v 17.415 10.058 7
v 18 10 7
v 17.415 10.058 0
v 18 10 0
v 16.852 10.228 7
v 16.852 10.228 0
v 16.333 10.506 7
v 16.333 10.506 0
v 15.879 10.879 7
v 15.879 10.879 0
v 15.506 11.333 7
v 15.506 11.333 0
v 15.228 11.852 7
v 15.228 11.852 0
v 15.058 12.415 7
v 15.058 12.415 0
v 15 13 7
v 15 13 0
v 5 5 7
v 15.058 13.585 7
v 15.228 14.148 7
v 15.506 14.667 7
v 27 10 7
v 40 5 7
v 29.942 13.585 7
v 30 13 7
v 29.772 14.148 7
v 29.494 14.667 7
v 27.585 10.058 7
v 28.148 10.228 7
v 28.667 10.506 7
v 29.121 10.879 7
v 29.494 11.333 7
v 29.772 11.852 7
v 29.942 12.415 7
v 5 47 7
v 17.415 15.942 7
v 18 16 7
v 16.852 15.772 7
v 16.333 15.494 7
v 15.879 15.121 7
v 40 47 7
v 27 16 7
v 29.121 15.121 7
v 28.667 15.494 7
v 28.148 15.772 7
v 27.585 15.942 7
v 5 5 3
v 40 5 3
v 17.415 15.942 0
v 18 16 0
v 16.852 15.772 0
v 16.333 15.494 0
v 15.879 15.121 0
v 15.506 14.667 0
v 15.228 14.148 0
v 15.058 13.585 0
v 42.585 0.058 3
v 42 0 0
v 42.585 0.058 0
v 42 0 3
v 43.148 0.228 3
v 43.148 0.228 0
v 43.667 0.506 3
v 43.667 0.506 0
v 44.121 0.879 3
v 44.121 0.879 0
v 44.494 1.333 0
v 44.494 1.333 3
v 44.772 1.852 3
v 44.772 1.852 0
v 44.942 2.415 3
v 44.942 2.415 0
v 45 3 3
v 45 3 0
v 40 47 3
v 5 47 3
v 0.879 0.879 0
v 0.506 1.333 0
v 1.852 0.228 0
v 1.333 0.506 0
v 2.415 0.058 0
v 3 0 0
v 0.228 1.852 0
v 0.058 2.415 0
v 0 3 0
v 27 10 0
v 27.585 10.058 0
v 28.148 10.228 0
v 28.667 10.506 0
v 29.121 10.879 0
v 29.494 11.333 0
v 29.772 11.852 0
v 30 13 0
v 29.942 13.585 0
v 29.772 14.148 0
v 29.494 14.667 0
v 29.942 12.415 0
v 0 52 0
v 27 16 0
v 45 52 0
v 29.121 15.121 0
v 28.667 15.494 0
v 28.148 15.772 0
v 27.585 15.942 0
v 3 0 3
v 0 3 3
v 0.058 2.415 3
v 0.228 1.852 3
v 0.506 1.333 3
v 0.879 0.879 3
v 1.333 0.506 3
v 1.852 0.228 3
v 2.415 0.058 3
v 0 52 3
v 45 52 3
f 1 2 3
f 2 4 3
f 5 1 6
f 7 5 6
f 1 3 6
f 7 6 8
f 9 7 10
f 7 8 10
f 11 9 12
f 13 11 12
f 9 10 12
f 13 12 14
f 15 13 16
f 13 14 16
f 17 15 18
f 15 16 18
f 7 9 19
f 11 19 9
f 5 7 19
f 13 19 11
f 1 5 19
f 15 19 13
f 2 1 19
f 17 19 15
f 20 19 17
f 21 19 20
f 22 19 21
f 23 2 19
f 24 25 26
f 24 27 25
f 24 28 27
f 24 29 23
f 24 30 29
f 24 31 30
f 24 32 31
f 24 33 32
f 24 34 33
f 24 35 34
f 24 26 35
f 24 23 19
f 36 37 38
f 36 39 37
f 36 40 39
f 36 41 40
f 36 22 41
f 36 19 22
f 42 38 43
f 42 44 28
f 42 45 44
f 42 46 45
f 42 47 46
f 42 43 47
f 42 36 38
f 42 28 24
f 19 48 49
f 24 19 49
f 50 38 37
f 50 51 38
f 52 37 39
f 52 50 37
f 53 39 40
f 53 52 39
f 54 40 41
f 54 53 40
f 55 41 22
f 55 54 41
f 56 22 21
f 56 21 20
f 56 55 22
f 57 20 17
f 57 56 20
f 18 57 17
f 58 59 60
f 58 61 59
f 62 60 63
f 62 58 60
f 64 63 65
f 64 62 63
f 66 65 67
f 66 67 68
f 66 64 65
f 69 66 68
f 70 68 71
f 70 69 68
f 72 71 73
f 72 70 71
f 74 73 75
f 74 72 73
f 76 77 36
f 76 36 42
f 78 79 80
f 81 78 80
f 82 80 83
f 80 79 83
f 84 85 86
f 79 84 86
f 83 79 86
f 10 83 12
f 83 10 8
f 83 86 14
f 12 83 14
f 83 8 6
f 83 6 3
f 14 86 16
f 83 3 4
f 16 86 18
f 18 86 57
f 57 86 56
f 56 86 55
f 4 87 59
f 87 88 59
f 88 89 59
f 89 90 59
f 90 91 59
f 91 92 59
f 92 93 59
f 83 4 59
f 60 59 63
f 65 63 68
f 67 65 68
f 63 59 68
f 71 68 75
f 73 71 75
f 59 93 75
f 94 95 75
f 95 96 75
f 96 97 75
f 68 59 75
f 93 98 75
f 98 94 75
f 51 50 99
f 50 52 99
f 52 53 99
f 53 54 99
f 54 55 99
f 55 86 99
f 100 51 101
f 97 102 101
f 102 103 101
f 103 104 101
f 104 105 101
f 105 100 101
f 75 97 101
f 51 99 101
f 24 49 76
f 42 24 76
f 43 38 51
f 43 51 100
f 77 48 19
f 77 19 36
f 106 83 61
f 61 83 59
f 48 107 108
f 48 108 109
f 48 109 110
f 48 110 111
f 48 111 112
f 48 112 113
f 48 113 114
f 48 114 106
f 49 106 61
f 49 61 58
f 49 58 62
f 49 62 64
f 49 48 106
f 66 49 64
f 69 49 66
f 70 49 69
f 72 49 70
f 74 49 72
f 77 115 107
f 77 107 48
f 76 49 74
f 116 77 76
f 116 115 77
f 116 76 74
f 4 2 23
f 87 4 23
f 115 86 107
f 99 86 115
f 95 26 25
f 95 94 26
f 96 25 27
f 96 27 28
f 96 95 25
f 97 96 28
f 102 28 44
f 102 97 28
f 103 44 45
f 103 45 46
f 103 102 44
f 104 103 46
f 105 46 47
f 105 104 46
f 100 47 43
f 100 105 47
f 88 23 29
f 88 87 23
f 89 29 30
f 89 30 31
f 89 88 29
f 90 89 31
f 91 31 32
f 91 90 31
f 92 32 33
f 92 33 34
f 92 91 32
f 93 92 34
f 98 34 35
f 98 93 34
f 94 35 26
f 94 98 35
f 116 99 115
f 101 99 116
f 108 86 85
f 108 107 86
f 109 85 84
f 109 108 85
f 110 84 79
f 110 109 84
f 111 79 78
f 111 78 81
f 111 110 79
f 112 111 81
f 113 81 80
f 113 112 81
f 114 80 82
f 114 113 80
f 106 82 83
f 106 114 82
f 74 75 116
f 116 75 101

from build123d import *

# Parameters (mm, degrees)
SKETCH1_W           = 45
SKETCH1_H           = 52
BOSS_EXTRUDE1_DEPTH = 3
SKETCH2_W           = 35
SKETCH2_H           = 42
BOSS_EXTRUDE2_DEPTH = 4
SKETCH3_W           = 15
SKETCH3_H           = 6
CUT_EXTRUDE1_DEPTH  = 70.123078635
FILLET1_R           = 3


with BuildPart() as part:
    # Sketch1 → Boss-Extrude1 (new body)
    with BuildSketch(Plane.XY):
        with Locations((22.5, 26)):
            Rectangle(SKETCH1_W, SKETCH1_H)
    extrude(amount=BOSS_EXTRUDE1_DEPTH)

    # Sketch2 → Boss-Extrude2 (add)
    with BuildSketch(Plane.XY.offset(3)):
        with Locations((22.5, 26)):
            Rectangle(SKETCH2_W, SKETCH2_H)
    extrude(amount=BOSS_EXTRUDE2_DEPTH)

    # Sketch3 → Cut-Extrude1 (cut, through all)
    with BuildSketch(Plane.XY.offset(7)):
        with Locations((22.5, 13)):
            Rectangle(SKETCH3_W, SKETCH3_H)
    extrude(amount=-CUT_EXTRUDE1_DEPTH, mode=Mode.SUBTRACT)

    # Fillet1
    fillet1_edges = [part.edges().sort_by_distance(p)[0] for p in [
        (30, 10, 3.5),
        (15, 10, 3.5),
        (30, 16, 3.5),
        (15, 16, 3.5),
        (45, 0, 1.5),
        (0, 0, 1.5),
    ]]
    fillet(fillet1_edges, radius=FILLET1_R - 0.0001)  # a hair under: the kernel refuses the full size


solid = part.part
